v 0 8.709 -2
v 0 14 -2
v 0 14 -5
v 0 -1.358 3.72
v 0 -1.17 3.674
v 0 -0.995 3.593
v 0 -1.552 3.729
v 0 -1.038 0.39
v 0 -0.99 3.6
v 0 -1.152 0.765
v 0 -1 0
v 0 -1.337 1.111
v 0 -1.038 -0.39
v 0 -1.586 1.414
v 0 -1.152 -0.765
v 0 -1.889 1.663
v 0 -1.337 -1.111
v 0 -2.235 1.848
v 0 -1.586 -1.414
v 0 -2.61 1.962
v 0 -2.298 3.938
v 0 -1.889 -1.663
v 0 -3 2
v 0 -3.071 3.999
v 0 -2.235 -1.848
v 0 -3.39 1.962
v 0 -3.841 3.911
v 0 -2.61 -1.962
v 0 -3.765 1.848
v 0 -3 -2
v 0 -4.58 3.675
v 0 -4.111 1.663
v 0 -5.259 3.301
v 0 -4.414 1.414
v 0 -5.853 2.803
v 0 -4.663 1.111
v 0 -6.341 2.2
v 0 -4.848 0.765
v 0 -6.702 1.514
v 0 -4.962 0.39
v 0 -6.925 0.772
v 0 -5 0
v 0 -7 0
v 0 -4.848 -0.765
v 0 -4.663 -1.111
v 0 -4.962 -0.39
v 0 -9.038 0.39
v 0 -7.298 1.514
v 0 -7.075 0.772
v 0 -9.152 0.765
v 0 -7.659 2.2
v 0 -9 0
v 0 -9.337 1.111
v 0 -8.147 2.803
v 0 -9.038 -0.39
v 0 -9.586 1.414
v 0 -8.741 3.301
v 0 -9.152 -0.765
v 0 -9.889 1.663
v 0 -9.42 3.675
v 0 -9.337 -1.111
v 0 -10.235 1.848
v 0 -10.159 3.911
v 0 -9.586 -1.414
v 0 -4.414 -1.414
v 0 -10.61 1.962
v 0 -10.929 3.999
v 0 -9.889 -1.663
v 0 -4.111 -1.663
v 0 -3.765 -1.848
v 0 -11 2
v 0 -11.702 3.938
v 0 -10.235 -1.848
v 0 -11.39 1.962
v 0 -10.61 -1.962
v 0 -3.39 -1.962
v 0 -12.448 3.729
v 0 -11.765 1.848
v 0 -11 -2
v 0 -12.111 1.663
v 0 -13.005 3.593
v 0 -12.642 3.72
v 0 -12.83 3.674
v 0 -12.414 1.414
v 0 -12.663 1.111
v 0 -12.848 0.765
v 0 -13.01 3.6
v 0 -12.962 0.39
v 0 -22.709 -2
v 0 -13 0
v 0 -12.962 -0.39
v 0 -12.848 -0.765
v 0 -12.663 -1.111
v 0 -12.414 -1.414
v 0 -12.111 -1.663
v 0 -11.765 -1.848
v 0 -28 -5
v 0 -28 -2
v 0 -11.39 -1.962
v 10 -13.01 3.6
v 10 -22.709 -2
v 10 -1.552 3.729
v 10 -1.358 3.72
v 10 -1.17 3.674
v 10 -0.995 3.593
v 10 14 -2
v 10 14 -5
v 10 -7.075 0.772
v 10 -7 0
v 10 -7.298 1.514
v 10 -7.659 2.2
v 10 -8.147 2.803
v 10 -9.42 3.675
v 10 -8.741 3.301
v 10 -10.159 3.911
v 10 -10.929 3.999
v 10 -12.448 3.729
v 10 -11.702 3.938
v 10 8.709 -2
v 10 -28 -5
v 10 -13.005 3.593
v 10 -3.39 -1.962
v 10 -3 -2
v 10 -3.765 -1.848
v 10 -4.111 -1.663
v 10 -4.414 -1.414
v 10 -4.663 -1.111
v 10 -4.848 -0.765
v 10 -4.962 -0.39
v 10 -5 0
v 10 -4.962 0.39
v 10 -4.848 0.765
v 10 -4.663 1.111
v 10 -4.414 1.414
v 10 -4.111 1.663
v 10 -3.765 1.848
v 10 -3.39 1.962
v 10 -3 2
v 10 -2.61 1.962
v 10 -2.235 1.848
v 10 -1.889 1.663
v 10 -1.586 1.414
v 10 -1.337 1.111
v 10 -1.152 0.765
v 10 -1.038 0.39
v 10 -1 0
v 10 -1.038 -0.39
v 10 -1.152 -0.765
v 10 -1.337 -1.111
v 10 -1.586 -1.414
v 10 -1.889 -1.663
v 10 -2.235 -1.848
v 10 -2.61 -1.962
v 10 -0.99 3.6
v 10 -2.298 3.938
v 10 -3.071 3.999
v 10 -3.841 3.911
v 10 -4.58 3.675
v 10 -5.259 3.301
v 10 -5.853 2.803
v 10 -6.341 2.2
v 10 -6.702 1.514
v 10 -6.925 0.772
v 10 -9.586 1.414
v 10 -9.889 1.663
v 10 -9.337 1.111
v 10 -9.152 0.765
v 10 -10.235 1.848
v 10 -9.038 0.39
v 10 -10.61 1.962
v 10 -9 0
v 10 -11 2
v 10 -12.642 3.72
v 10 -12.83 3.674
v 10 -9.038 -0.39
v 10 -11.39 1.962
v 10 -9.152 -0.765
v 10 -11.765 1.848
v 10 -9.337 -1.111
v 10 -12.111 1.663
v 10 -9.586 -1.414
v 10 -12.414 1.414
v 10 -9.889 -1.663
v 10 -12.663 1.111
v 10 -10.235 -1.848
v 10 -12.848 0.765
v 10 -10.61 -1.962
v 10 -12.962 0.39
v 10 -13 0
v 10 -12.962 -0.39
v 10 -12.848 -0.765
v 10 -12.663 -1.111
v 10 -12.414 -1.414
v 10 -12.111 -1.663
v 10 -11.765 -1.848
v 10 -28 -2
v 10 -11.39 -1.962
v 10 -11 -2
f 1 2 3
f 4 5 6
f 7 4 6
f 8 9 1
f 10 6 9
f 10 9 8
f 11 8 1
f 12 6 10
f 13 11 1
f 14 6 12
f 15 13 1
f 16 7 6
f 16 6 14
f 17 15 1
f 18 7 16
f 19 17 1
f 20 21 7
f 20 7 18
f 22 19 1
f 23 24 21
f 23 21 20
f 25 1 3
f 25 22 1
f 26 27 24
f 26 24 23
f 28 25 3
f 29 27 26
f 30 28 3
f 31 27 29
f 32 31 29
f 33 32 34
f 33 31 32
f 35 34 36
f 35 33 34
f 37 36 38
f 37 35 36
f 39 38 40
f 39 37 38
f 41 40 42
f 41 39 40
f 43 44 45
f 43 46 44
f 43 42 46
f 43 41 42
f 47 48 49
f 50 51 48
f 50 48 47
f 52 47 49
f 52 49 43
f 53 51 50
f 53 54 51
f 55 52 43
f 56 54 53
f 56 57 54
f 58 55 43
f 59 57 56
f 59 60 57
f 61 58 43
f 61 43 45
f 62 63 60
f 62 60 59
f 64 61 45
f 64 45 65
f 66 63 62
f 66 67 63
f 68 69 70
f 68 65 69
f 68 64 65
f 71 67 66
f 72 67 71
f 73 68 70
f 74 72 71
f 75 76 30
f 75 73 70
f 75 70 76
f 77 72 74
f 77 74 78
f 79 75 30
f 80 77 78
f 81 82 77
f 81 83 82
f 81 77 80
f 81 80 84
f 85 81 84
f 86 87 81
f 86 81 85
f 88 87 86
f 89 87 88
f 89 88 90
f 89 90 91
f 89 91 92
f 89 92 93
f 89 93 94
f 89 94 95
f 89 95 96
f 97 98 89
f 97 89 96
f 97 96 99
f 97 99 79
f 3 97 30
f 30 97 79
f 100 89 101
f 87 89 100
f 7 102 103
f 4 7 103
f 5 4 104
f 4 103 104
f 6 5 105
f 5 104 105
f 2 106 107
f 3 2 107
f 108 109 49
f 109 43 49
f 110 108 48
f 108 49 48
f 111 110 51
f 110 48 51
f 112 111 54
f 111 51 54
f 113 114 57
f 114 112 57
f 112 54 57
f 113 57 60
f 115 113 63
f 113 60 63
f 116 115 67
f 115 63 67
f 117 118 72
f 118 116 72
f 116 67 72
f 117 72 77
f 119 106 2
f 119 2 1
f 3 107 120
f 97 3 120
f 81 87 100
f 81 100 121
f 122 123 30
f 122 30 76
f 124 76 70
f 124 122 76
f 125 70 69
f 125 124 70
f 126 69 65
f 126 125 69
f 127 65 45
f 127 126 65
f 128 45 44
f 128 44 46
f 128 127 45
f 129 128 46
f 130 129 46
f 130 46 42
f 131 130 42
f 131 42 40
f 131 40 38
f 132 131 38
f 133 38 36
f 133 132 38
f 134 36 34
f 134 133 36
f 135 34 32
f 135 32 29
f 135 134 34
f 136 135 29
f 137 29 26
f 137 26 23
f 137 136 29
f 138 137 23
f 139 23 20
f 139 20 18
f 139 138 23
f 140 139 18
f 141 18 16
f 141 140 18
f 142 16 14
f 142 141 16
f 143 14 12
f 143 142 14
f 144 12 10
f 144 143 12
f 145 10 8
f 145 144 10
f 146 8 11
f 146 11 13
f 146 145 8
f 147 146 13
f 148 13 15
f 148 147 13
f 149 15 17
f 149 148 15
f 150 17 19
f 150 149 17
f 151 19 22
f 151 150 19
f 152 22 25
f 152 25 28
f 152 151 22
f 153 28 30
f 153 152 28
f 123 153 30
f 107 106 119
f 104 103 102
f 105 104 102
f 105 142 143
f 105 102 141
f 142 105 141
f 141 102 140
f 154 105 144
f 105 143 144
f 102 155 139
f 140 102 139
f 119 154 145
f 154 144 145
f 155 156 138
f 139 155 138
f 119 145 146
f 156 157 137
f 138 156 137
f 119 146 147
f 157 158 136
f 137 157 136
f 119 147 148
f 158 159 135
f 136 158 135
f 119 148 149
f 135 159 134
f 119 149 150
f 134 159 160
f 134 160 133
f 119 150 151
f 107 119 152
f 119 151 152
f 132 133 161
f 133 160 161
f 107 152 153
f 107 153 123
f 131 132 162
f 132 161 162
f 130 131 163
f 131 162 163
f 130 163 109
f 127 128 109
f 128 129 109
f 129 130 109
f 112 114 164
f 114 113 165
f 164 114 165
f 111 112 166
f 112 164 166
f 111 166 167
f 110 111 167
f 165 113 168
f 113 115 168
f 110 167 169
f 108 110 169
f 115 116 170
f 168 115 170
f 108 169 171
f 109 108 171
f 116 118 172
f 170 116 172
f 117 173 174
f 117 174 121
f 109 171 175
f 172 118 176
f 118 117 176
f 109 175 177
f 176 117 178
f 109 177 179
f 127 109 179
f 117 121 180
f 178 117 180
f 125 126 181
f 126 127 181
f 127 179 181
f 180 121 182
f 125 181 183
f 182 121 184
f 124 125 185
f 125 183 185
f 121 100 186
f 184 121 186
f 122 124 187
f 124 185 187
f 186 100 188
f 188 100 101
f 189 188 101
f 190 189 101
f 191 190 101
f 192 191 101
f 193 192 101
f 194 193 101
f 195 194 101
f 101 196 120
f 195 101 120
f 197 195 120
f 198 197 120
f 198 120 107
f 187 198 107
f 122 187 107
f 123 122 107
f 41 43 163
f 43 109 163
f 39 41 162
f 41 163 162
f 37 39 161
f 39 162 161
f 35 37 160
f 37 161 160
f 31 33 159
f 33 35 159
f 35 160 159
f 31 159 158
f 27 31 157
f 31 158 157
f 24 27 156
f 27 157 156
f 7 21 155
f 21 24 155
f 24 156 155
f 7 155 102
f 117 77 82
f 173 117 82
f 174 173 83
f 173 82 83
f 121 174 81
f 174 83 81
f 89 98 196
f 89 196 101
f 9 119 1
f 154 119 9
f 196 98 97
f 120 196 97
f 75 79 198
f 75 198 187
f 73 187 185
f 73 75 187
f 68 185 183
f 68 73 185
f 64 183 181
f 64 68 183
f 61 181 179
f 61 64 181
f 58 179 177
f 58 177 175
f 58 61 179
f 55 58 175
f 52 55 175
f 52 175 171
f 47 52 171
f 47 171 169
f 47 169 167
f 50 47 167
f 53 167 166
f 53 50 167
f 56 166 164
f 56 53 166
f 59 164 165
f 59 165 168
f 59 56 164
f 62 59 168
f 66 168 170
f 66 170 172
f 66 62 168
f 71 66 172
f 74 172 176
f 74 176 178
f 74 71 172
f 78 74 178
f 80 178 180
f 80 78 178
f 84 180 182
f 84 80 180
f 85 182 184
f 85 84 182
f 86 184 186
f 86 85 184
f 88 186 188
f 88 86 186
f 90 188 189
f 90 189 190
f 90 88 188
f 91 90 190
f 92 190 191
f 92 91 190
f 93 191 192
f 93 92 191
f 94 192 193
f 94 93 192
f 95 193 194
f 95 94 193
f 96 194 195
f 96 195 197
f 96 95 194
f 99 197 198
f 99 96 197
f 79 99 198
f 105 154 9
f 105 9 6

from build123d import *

# Parameters (mm, degrees)
CYLINDER033_R             = 2
CYLINDER033_DEPTH         = 10
CYLINDER031_R             = 2
CYLINDER031_DEPTH         = 10
CYLINDER032_R             = 1
CYLINDER032_DEPTH         = 10
BOX031_W                  = 3
BOX031_H                  = 20
BOX031_DEPTH              = 10
BOX032_W                  = 1
BOX032_H                  = 15
BOX032_DEPTH              = 10
BOX032_PLACEMENT_ANGLE    = 30
BOX033_W                  = 3.3
BOX033_H                  = 8
BOX033_DEPTH              = 10
BOX033_PLACEMENT_ANGLE    = 30
CYLINDER029_R             = 2
CYLINDER029_DEPTH         = 10
CYLINDER030_R             = 4
CYLINDER030_DEPTH         = 10
FUSION024_PLACEMENT_ANGLE = 180
CYLINDER027_R             = 2
CYLINDER027_DEPTH         = 10
CYLINDER028_R             = 1
CYLINDER028_DEPTH         = 10
BOX028_W                  = 3
BOX028_H                  = 22
BOX028_DEPTH              = 10
BOX029_W                  = 1
BOX029_H                  = 15
BOX029_DEPTH              = 10
BOX029_PLACEMENT_ANGLE    = 30
BOX030_W                  = 3.3
BOX030_H                  = 8
BOX030_DEPTH              = 10
BOX030_PLACEMENT_ANGLE    = 30
CYLINDER025_R             = 2
CYLINDER025_DEPTH         = 10
CYLINDER026_R             = 4
CYLINDER026_DEPTH         = 10
FUSION026_PITCH_ANGLE     = 90


with BuildPart() as zylinder024:
    # Cylinder033 → Cylinder033 (new body)
    with BuildSketch(Plane(origin=(2, -7, 0), x_dir=(1, 0, 0), z_dir=(0, 0, 1))):
        Circle(CYLINDER033_R)
    extrude(amount=CYLINDER033_DEPTH)


with BuildPart() as zylinder022:
    # Cylinder031 → Cylinder031 (new body)
    with BuildSketch(Plane(origin=(2, -15, 0), x_dir=(1, 0, 0), z_dir=(0, 0, 1))):
        Circle(CYLINDER031_R)
    extrude(amount=CYLINDER031_DEPTH)


with BuildPart() as zylinder023:
    # Cylinder032 → Cylinder032 (new body)
    with BuildSketch(Plane(origin=(-2.73, -12.5, 0), x_dir=(1, 0, 0), z_dir=(0, 0, 1))):
        Circle(CYLINDER032_R)
    extrude(amount=CYLINDER032_DEPTH)


with BuildPart() as w_rfel030:
    # Box031 → Box031 (new body)
    with BuildSketch(Plane(origin=(2, -28, 0), x_dir=(1, 0, 0), z_dir=(0, 0, 1))):
        with Locations((1.5, 10)):
            Rectangle(BOX031_W, BOX031_H)
    extrude(amount=BOX031_DEPTH)


with BuildPart() as w_rfel031:
    # Box032 → Box032 (new body)
    with BuildSketch(Plane.XY):
        with Locations((0.5, 7.5)):
            Rectangle(BOX032_W, BOX032_H)
    extrude(amount=BOX032_DEPTH)


with BuildPart() as w_rfel031_1:
    # Box032 placement: moved
    add(w_rfel031.part.moved(Location((3.9, -26, 0))).rotate(Axis((3.9, -26, 0), (0, 0, 1)), BOX032_PLACEMENT_ANGLE))


with BuildPart() as w_rfel032:
    # Box033 → Box033 (new body)
    with BuildSketch(Plane.XY):
        with Locations((1.65, 4)):
            Rectangle(BOX033_W, BOX033_H)
    extrude(amount=BOX033_DEPTH)


with BuildPart() as w_rfel032_1:
    # Box033 placement: moved
    add(w_rfel032.part.moved(Location((2, -21.5, 0))).rotate(Axis((2, -21.5, 0), (0, 0, 1)), BOX033_PLACEMENT_ANGLE))


with BuildPart() as zylinder020:
    # Cylinder029 → Cylinder029 (new body)
    with BuildSketch(Plane.XY):
        Circle(CYLINDER029_R)
    extrude(amount=CYLINDER029_DEPTH)


with BuildPart() as fusion024:
    # Cylinder030 → Cylinder030 (new body)
    with BuildSketch(Plane.XY):
        Circle(CYLINDER030_R)
    extrude(amount=CYLINDER030_DEPTH)

    # Cut010: cut Zylinder020
    add(zylinder020.part, mode=Mode.SUBTRACT)


with BuildPart() as fusion024_1:
    # Cut010 placement: moved
    add(fusion024.part.moved(Location((0, -11, 0))))

    # Fusion024: union Zylinder022, Zylinder023, Würfel030, Würfel031, Würfel032
    add(zylinder022.part)
    add(zylinder023.part)
    add(w_rfel030.part)
    add(w_rfel031_1.part)
    add(w_rfel032_1.part)


with BuildPart() as fusion024_2:
    # Fusion024 placement: moved
    add(fusion024_1.part.moved(Location((0, -14, 10))).rotate(Axis((0, -14, 10), (1, 0, 0)), FUSION024_PLACEMENT_ANGLE))


with BuildPart() as zylinder018:
    # Cylinder027 → Cylinder027 (new body)
    with BuildSketch(Plane(origin=(2, -15, 0), x_dir=(1, 0, 0), z_dir=(0, 0, 1))):
        Circle(CYLINDER027_R)
    extrude(amount=CYLINDER027_DEPTH)


with BuildPart() as zylinder019:
    # Cylinder028 → Cylinder028 (new body)
    with BuildSketch(Plane(origin=(-2.73, -12.5, 0), x_dir=(1, 0, 0), z_dir=(0, 0, 1))):
        Circle(CYLINDER028_R)
    extrude(amount=CYLINDER028_DEPTH)


with BuildPart() as w_rfel027:
    # Box028 → Box028 (new body)
    with BuildSketch(Plane(origin=(2, -28, 0), x_dir=(1, 0, 0), z_dir=(0, 0, 1))):
        with Locations((1.5, 11)):
            Rectangle(BOX028_W, BOX028_H)
    extrude(amount=BOX028_DEPTH)


with BuildPart() as w_rfel028:
    # Box029 → Box029 (new body)
    with BuildSketch(Plane.XY):
        with Locations((0.5, 7.5)):
            Rectangle(BOX029_W, BOX029_H)
    extrude(amount=BOX029_DEPTH)


with BuildPart() as w_rfel028_1:
    # Box029 placement: moved
    add(w_rfel028.part.moved(Location((3.9, -26, 0))).rotate(Axis((3.9, -26, 0), (0, 0, 1)), BOX029_PLACEMENT_ANGLE))


with BuildPart() as w_rfel029:
    # Box030 → Box030 (new body)
    with BuildSketch(Plane.XY):
        with Locations((1.65, 4)):
            Rectangle(BOX030_W, BOX030_H)
    extrude(amount=BOX030_DEPTH)


with BuildPart() as w_rfel029_1:
    # Box030 placement: moved
    add(w_rfel029.part.moved(Location((2, -21.5, 0))).rotate(Axis((2, -21.5, 0), (0, 0, 1)), BOX030_PLACEMENT_ANGLE))


with BuildPart() as zylinder016:
    # Cylinder025 → Cylinder025 (new body)
    with BuildSketch(Plane.XY):
        Circle(CYLINDER025_R)
    extrude(amount=CYLINDER025_DEPTH)


with BuildPart() as fusion026:
    # Cylinder026 → Cylinder026 (new body)
    with BuildSketch(Plane.XY):
        Circle(CYLINDER026_R)
    extrude(amount=CYLINDER026_DEPTH)

    # Cut009: cut Zylinder016
    add(zylinder016.part, mode=Mode.SUBTRACT)


with BuildPart() as fusion026_1:
    # Cut009 placement: moved
    add(fusion026.part.moved(Location((0, -11, 0))))

    # Fusion023: union Zylinder018, Zylinder019, Würfel027, Würfel028, Würfel029
    add(zylinder018.part)
    add(zylinder019.part)
    add(w_rfel027.part)
    add(w_rfel028_1.part)
    add(w_rfel029_1.part)

    # Fusion025: union Fusion024
    add(fusion024_2.part)

    # Fusion026: union Zylinder024
    add(zylinder024.part)


with BuildPart() as fusion026_2:
    # Fusion026 pitch: moved
    add(fusion026_1.part.rotate(Axis((0, 0, 0), (0, 1, 0)), FUSION026_PITCH_ANGLE))


with BuildPart() as fusion026_3:
    # Fusion026 placement: moved
    add(fusion026_2.part)


solid = fusion026_3.part
